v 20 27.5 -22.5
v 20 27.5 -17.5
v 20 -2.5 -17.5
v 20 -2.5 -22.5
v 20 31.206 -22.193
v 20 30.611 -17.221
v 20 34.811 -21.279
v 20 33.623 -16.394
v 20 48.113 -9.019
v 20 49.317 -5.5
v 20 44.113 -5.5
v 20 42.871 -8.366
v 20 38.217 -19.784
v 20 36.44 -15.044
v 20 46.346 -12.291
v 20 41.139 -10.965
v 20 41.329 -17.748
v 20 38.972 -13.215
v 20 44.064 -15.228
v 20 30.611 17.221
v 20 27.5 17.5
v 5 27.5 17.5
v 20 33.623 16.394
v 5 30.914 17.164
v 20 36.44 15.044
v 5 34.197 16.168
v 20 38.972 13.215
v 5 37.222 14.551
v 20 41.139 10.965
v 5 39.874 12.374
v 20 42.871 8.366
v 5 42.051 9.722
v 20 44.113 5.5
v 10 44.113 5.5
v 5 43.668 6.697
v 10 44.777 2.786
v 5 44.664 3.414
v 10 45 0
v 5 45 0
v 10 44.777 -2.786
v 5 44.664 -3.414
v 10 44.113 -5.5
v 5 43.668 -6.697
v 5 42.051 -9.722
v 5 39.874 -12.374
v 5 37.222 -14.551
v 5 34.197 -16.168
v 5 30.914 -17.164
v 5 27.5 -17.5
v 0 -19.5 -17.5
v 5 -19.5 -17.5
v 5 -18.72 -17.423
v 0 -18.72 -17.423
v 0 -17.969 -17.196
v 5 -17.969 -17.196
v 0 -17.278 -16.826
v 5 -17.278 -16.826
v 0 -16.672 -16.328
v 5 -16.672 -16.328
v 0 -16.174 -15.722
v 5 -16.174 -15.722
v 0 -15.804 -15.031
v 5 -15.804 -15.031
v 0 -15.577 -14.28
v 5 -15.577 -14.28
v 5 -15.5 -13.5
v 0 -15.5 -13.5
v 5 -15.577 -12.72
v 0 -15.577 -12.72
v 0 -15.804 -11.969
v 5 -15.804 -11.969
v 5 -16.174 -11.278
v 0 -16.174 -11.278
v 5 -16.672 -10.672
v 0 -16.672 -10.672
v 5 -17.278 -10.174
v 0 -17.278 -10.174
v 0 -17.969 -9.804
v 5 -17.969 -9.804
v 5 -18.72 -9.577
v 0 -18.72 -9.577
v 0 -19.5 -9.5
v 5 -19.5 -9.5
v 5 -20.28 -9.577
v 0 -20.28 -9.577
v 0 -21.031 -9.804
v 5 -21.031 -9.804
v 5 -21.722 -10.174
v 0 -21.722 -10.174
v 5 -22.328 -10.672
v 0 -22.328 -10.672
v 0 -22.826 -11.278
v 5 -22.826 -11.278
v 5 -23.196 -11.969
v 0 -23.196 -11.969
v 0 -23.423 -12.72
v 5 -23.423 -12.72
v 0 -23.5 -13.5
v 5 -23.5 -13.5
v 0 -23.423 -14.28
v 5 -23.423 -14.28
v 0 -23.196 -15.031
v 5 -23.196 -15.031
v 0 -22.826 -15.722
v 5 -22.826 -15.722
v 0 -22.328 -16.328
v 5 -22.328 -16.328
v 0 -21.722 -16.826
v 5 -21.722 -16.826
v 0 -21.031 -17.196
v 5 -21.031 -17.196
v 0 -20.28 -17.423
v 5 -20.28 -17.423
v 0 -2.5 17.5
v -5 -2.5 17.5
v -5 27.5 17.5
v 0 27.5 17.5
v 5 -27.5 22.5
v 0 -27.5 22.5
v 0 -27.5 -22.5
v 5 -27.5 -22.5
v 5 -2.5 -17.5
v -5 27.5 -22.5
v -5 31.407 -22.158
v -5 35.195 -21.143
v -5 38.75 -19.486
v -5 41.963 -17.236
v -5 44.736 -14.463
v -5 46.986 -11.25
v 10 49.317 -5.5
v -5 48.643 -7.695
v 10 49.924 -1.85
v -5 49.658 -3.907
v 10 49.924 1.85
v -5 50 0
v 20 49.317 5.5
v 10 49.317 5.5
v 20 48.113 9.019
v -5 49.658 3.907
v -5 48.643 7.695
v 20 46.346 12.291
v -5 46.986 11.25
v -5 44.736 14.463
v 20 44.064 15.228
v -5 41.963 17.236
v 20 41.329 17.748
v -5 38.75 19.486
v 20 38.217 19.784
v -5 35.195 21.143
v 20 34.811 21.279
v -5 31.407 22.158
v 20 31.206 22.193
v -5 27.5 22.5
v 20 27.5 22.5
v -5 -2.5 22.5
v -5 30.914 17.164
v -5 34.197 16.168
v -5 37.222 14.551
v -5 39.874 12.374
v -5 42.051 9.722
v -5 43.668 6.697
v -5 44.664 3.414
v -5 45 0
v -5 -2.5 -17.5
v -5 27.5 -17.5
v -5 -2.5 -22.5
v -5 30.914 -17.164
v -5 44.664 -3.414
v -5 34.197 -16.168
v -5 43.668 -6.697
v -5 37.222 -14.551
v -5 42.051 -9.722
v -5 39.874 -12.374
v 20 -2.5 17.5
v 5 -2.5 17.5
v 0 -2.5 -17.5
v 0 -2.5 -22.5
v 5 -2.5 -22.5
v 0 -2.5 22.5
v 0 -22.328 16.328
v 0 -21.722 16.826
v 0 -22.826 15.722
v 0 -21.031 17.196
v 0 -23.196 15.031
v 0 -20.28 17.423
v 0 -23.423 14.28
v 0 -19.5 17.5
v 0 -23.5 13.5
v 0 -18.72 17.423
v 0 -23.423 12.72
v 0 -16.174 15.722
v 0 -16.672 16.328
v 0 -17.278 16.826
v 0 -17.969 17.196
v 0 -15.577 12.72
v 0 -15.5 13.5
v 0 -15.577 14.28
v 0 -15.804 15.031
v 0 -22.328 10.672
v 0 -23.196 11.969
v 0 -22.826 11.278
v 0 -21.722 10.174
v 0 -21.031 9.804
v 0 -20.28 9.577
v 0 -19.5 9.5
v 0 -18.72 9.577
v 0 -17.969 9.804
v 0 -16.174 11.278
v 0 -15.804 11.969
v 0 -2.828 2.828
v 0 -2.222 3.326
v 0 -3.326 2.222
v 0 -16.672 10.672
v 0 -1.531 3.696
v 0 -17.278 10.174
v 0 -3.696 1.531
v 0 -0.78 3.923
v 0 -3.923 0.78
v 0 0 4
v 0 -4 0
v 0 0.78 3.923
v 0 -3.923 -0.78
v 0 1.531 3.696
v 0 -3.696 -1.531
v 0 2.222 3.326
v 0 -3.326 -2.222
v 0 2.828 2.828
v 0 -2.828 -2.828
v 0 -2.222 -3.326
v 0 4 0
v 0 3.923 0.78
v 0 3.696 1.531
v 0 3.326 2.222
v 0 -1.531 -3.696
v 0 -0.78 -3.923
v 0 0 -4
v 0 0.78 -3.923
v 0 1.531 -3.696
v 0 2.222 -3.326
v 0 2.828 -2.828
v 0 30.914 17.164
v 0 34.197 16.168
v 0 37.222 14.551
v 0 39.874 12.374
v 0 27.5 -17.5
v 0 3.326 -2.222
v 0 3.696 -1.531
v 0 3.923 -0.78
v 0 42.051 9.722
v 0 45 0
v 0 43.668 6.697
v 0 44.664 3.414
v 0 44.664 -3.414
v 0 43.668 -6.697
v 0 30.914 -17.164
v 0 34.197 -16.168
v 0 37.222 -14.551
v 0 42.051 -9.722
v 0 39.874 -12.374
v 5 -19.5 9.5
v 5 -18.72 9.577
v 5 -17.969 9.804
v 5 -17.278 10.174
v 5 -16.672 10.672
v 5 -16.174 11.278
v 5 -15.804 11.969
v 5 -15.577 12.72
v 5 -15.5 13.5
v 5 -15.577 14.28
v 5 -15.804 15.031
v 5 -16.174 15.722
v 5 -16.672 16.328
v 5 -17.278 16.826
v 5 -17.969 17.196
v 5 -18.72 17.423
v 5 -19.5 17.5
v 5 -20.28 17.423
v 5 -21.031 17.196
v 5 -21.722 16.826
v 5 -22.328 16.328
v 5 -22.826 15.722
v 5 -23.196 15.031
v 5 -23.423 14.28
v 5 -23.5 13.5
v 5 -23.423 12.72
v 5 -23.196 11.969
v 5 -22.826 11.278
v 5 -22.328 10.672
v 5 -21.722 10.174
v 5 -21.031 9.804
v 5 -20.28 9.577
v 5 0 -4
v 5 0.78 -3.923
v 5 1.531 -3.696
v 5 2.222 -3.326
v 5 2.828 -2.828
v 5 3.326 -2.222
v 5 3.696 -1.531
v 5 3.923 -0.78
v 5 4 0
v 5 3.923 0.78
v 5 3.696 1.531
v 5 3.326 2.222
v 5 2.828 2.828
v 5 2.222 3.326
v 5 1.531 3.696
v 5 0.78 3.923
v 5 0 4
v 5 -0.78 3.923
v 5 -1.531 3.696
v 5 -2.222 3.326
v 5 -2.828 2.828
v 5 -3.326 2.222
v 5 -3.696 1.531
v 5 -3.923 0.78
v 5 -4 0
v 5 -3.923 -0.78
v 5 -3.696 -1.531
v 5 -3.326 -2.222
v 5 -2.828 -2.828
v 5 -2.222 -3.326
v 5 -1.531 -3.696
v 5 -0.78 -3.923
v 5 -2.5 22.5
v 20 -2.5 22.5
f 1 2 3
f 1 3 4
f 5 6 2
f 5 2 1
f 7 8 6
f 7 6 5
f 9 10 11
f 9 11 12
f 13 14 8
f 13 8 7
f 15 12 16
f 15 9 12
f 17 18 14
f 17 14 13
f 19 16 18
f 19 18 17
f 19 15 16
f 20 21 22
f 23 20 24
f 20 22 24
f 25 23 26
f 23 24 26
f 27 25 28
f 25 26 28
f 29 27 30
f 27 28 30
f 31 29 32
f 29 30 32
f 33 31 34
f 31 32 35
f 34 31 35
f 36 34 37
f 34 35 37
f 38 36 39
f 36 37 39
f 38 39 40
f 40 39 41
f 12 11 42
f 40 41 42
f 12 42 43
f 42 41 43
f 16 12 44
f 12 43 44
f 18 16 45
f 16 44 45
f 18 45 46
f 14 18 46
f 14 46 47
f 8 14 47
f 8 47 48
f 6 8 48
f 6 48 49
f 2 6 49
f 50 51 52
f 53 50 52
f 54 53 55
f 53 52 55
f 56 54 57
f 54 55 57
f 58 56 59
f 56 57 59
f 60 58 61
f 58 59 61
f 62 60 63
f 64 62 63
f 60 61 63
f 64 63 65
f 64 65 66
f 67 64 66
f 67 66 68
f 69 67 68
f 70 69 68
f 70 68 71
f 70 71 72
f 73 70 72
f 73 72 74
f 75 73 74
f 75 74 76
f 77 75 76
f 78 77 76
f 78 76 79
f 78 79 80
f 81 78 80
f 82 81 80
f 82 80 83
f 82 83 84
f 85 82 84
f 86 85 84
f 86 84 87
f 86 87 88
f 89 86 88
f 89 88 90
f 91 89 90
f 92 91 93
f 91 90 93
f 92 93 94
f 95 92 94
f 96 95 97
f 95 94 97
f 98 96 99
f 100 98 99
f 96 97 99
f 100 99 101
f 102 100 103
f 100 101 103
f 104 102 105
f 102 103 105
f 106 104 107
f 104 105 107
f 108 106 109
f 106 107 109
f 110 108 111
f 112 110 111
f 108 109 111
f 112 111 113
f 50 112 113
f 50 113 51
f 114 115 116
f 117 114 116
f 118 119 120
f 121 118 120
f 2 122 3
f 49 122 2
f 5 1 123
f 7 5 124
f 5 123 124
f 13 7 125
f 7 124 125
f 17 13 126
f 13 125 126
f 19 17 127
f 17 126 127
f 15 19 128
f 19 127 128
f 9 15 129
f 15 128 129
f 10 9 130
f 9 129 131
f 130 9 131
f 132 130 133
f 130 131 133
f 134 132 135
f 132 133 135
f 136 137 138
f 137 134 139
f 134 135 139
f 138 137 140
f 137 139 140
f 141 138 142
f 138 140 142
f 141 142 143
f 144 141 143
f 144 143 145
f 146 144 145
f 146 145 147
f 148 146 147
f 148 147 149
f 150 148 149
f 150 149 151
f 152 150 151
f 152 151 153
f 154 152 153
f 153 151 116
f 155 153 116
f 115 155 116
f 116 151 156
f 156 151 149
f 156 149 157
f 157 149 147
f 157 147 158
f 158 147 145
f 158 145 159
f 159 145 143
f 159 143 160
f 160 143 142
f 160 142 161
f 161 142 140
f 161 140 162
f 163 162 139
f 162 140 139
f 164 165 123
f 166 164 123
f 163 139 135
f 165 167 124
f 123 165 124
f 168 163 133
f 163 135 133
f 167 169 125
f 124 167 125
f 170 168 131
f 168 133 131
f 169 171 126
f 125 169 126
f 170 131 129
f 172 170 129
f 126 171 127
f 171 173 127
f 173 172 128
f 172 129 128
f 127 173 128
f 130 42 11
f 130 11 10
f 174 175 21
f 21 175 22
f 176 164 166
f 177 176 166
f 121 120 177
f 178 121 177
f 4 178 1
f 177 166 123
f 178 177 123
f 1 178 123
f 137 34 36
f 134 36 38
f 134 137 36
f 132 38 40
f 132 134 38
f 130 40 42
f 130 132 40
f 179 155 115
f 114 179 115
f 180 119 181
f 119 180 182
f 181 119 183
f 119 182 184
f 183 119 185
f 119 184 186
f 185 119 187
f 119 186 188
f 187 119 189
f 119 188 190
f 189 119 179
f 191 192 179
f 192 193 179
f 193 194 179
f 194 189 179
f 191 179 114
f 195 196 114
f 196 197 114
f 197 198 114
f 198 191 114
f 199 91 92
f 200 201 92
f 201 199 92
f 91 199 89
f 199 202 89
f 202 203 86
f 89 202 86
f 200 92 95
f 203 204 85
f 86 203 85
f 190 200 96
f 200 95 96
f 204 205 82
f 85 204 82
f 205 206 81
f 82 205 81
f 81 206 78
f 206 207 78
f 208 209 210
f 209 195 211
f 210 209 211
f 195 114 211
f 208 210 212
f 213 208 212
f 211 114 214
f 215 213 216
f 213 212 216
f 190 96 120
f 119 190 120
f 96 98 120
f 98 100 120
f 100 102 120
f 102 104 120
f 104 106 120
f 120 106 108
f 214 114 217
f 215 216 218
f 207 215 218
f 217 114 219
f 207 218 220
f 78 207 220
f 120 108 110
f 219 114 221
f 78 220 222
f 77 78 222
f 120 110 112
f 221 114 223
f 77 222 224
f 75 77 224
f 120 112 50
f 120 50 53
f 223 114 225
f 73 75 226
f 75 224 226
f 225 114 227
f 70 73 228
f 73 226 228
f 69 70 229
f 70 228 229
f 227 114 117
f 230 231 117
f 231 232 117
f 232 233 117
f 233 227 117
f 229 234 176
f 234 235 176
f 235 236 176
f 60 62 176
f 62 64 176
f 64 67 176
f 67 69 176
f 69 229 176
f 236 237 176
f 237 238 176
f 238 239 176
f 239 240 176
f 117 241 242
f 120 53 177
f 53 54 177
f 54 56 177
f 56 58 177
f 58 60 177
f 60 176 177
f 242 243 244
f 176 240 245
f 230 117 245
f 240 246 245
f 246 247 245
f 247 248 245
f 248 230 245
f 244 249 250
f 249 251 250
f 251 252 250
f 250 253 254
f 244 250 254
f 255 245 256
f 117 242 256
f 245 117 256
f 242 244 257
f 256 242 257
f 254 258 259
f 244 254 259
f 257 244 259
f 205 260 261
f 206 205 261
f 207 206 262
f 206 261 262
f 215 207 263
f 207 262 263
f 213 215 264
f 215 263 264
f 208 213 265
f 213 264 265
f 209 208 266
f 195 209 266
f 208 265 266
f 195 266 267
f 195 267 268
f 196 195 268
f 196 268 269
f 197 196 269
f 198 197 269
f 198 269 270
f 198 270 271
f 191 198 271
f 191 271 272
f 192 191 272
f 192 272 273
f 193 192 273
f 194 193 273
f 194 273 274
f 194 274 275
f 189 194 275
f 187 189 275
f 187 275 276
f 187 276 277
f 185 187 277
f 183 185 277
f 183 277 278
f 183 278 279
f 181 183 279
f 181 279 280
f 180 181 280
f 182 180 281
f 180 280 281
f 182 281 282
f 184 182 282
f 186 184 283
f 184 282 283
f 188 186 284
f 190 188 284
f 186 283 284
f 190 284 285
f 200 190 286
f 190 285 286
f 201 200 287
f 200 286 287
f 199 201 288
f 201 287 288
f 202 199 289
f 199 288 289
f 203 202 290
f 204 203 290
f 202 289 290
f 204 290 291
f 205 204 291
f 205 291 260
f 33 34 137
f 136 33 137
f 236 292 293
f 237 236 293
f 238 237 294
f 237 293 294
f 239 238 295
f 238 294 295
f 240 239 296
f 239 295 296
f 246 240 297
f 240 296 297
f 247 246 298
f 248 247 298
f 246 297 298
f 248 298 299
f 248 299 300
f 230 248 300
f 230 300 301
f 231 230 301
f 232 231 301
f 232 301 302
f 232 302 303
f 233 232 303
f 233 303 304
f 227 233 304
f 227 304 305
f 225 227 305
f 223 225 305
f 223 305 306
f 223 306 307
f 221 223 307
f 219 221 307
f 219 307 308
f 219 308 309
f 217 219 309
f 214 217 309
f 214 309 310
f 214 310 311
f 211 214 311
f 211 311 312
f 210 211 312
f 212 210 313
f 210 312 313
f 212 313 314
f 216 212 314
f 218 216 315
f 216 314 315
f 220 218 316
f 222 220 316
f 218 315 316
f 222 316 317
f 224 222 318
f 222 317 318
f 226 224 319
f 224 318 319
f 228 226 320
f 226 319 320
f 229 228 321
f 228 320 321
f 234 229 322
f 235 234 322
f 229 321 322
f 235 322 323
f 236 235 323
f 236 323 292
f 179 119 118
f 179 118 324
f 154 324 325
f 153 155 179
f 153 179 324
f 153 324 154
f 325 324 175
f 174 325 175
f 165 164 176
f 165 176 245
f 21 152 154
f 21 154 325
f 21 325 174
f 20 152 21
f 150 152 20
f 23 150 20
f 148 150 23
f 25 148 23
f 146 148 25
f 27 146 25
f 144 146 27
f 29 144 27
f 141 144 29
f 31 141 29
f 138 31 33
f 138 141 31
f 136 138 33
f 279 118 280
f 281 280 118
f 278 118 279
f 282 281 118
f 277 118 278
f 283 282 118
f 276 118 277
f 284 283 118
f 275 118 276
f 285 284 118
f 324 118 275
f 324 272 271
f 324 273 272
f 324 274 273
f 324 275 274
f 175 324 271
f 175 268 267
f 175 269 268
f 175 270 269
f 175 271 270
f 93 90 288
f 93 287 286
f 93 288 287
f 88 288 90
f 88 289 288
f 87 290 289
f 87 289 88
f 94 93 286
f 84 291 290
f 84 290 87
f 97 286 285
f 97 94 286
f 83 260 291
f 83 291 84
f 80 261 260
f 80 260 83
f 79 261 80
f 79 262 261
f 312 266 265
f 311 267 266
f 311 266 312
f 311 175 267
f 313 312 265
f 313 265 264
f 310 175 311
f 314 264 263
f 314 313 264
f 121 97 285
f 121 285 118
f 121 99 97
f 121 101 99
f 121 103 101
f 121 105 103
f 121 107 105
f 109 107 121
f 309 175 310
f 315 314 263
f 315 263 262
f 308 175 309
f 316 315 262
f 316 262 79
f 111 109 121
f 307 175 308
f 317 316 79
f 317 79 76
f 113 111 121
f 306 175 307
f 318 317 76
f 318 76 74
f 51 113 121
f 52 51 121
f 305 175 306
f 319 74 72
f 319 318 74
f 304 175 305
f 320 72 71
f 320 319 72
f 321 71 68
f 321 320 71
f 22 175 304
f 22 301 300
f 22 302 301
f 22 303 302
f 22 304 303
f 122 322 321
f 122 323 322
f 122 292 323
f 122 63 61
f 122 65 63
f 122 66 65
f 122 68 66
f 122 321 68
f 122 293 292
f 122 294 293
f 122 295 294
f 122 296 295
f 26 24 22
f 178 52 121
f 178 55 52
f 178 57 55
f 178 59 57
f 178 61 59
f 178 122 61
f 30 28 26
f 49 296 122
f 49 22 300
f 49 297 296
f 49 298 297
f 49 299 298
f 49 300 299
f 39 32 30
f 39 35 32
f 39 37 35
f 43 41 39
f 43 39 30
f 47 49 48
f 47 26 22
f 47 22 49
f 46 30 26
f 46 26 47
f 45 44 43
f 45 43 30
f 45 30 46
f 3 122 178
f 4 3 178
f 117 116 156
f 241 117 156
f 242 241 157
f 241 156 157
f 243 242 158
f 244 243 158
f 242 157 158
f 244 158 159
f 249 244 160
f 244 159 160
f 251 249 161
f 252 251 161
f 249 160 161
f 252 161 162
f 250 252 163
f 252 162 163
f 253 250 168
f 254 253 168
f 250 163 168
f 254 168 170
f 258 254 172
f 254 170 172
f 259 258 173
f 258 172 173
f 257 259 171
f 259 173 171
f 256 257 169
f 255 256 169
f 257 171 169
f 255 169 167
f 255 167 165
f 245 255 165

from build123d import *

# Parameters (mm, degrees)
EXTRUDE_1_DEPTH      = 5
EXTRUDE_2_DEPTH      = 20
EXTRUDE_2_DEPTH_BACK = 5
SKETCH_3_R           = 4
CUT_EXTRUDE_2_DEPTH  = 57.844085005
SKETCH_5_W           = 11
SKETCH_5_H           = 15
CUT_EXTRUDE_3_DEPTH  = 10


with BuildPart() as part:
    # Эскиз1 → Бобышка-Вытянуть1 (new body)
    with BuildSketch(Plane(origin=(0, 0, 0), x_dir=(0, 0, -1), z_dir=(1, 0, 0))):
        with BuildLine():
            Line((22.5, -27.5), (22.5, 27.5))
            ThreePointArc((22.5, 27.5), (0, 50), (-22.5, 27.5))
            Line((-22.5, 27.5), (-22.5, -27.5))
            Line((-22.5, -27.5), (22.5, -27.5))
        make_face()
    extrude(amount=EXTRUDE_1_DEPTH)

    # Эскиз1<3> → Бобышка-Вытянуть2 (add, two sides: drawn at the far end of the back side and taken through both)
    with BuildSketch(Plane(origin=(0, 0, 0), x_dir=(0, 0, -1), z_dir=(1, 0, 0)).offset(-EXTRUDE_2_DEPTH_BACK)):
        with BuildLine():
            Line((-17.5, -2.5), (-17.5, 27.5))
            ThreePointArc((-17.5, 27.5), (0, 45), (17.5, 27.5))
            Line((17.5, 27.5), (17.5, -2.5))
            Line((17.5, -2.5), (22.5, -2.5))
            Line((22.5, -2.5), (22.5, 27.5))
            ThreePointArc((22.5, 27.5), (0, 50), (-22.5, 27.5))
            Line((-22.5, 27.5), (-22.5, -2.5))
            Line((-22.5, -2.5), (-17.5, -2.5))
        make_face()
    extrude(amount=EXTRUDE_2_DEPTH + EXTRUDE_2_DEPTH_BACK)

    # Эскиз3 → Вырез-Вытянуть2 (cut, through all)
    with BuildSketch(Plane(origin=(5, 0, 0), x_dir=(0, 0, -1), z_dir=(1, 0, 0))):
        with Locations((-13.5, -19.5)):
            Circle(SKETCH_3_R)
        with Locations((13.5, -19.5)):
            Circle(SKETCH_3_R)
        Circle(SKETCH_3_R)
    extrude(amount=-CUT_EXTRUDE_2_DEPTH, mode=Mode.SUBTRACT)

    # Эскиз5 → Вырез-Вытянуть3 (cut)
    with BuildSketch(Plane(origin=(20, 0, 0), x_dir=(0, 0, -1), z_dir=(1, 0, 0))):
        with Locations((0, 47.5)):
            Rectangle(SKETCH_5_W, SKETCH_5_H)
    extrude(amount=-CUT_EXTRUDE_3_DEPTH, mode=Mode.SUBTRACT)


solid = part.part
